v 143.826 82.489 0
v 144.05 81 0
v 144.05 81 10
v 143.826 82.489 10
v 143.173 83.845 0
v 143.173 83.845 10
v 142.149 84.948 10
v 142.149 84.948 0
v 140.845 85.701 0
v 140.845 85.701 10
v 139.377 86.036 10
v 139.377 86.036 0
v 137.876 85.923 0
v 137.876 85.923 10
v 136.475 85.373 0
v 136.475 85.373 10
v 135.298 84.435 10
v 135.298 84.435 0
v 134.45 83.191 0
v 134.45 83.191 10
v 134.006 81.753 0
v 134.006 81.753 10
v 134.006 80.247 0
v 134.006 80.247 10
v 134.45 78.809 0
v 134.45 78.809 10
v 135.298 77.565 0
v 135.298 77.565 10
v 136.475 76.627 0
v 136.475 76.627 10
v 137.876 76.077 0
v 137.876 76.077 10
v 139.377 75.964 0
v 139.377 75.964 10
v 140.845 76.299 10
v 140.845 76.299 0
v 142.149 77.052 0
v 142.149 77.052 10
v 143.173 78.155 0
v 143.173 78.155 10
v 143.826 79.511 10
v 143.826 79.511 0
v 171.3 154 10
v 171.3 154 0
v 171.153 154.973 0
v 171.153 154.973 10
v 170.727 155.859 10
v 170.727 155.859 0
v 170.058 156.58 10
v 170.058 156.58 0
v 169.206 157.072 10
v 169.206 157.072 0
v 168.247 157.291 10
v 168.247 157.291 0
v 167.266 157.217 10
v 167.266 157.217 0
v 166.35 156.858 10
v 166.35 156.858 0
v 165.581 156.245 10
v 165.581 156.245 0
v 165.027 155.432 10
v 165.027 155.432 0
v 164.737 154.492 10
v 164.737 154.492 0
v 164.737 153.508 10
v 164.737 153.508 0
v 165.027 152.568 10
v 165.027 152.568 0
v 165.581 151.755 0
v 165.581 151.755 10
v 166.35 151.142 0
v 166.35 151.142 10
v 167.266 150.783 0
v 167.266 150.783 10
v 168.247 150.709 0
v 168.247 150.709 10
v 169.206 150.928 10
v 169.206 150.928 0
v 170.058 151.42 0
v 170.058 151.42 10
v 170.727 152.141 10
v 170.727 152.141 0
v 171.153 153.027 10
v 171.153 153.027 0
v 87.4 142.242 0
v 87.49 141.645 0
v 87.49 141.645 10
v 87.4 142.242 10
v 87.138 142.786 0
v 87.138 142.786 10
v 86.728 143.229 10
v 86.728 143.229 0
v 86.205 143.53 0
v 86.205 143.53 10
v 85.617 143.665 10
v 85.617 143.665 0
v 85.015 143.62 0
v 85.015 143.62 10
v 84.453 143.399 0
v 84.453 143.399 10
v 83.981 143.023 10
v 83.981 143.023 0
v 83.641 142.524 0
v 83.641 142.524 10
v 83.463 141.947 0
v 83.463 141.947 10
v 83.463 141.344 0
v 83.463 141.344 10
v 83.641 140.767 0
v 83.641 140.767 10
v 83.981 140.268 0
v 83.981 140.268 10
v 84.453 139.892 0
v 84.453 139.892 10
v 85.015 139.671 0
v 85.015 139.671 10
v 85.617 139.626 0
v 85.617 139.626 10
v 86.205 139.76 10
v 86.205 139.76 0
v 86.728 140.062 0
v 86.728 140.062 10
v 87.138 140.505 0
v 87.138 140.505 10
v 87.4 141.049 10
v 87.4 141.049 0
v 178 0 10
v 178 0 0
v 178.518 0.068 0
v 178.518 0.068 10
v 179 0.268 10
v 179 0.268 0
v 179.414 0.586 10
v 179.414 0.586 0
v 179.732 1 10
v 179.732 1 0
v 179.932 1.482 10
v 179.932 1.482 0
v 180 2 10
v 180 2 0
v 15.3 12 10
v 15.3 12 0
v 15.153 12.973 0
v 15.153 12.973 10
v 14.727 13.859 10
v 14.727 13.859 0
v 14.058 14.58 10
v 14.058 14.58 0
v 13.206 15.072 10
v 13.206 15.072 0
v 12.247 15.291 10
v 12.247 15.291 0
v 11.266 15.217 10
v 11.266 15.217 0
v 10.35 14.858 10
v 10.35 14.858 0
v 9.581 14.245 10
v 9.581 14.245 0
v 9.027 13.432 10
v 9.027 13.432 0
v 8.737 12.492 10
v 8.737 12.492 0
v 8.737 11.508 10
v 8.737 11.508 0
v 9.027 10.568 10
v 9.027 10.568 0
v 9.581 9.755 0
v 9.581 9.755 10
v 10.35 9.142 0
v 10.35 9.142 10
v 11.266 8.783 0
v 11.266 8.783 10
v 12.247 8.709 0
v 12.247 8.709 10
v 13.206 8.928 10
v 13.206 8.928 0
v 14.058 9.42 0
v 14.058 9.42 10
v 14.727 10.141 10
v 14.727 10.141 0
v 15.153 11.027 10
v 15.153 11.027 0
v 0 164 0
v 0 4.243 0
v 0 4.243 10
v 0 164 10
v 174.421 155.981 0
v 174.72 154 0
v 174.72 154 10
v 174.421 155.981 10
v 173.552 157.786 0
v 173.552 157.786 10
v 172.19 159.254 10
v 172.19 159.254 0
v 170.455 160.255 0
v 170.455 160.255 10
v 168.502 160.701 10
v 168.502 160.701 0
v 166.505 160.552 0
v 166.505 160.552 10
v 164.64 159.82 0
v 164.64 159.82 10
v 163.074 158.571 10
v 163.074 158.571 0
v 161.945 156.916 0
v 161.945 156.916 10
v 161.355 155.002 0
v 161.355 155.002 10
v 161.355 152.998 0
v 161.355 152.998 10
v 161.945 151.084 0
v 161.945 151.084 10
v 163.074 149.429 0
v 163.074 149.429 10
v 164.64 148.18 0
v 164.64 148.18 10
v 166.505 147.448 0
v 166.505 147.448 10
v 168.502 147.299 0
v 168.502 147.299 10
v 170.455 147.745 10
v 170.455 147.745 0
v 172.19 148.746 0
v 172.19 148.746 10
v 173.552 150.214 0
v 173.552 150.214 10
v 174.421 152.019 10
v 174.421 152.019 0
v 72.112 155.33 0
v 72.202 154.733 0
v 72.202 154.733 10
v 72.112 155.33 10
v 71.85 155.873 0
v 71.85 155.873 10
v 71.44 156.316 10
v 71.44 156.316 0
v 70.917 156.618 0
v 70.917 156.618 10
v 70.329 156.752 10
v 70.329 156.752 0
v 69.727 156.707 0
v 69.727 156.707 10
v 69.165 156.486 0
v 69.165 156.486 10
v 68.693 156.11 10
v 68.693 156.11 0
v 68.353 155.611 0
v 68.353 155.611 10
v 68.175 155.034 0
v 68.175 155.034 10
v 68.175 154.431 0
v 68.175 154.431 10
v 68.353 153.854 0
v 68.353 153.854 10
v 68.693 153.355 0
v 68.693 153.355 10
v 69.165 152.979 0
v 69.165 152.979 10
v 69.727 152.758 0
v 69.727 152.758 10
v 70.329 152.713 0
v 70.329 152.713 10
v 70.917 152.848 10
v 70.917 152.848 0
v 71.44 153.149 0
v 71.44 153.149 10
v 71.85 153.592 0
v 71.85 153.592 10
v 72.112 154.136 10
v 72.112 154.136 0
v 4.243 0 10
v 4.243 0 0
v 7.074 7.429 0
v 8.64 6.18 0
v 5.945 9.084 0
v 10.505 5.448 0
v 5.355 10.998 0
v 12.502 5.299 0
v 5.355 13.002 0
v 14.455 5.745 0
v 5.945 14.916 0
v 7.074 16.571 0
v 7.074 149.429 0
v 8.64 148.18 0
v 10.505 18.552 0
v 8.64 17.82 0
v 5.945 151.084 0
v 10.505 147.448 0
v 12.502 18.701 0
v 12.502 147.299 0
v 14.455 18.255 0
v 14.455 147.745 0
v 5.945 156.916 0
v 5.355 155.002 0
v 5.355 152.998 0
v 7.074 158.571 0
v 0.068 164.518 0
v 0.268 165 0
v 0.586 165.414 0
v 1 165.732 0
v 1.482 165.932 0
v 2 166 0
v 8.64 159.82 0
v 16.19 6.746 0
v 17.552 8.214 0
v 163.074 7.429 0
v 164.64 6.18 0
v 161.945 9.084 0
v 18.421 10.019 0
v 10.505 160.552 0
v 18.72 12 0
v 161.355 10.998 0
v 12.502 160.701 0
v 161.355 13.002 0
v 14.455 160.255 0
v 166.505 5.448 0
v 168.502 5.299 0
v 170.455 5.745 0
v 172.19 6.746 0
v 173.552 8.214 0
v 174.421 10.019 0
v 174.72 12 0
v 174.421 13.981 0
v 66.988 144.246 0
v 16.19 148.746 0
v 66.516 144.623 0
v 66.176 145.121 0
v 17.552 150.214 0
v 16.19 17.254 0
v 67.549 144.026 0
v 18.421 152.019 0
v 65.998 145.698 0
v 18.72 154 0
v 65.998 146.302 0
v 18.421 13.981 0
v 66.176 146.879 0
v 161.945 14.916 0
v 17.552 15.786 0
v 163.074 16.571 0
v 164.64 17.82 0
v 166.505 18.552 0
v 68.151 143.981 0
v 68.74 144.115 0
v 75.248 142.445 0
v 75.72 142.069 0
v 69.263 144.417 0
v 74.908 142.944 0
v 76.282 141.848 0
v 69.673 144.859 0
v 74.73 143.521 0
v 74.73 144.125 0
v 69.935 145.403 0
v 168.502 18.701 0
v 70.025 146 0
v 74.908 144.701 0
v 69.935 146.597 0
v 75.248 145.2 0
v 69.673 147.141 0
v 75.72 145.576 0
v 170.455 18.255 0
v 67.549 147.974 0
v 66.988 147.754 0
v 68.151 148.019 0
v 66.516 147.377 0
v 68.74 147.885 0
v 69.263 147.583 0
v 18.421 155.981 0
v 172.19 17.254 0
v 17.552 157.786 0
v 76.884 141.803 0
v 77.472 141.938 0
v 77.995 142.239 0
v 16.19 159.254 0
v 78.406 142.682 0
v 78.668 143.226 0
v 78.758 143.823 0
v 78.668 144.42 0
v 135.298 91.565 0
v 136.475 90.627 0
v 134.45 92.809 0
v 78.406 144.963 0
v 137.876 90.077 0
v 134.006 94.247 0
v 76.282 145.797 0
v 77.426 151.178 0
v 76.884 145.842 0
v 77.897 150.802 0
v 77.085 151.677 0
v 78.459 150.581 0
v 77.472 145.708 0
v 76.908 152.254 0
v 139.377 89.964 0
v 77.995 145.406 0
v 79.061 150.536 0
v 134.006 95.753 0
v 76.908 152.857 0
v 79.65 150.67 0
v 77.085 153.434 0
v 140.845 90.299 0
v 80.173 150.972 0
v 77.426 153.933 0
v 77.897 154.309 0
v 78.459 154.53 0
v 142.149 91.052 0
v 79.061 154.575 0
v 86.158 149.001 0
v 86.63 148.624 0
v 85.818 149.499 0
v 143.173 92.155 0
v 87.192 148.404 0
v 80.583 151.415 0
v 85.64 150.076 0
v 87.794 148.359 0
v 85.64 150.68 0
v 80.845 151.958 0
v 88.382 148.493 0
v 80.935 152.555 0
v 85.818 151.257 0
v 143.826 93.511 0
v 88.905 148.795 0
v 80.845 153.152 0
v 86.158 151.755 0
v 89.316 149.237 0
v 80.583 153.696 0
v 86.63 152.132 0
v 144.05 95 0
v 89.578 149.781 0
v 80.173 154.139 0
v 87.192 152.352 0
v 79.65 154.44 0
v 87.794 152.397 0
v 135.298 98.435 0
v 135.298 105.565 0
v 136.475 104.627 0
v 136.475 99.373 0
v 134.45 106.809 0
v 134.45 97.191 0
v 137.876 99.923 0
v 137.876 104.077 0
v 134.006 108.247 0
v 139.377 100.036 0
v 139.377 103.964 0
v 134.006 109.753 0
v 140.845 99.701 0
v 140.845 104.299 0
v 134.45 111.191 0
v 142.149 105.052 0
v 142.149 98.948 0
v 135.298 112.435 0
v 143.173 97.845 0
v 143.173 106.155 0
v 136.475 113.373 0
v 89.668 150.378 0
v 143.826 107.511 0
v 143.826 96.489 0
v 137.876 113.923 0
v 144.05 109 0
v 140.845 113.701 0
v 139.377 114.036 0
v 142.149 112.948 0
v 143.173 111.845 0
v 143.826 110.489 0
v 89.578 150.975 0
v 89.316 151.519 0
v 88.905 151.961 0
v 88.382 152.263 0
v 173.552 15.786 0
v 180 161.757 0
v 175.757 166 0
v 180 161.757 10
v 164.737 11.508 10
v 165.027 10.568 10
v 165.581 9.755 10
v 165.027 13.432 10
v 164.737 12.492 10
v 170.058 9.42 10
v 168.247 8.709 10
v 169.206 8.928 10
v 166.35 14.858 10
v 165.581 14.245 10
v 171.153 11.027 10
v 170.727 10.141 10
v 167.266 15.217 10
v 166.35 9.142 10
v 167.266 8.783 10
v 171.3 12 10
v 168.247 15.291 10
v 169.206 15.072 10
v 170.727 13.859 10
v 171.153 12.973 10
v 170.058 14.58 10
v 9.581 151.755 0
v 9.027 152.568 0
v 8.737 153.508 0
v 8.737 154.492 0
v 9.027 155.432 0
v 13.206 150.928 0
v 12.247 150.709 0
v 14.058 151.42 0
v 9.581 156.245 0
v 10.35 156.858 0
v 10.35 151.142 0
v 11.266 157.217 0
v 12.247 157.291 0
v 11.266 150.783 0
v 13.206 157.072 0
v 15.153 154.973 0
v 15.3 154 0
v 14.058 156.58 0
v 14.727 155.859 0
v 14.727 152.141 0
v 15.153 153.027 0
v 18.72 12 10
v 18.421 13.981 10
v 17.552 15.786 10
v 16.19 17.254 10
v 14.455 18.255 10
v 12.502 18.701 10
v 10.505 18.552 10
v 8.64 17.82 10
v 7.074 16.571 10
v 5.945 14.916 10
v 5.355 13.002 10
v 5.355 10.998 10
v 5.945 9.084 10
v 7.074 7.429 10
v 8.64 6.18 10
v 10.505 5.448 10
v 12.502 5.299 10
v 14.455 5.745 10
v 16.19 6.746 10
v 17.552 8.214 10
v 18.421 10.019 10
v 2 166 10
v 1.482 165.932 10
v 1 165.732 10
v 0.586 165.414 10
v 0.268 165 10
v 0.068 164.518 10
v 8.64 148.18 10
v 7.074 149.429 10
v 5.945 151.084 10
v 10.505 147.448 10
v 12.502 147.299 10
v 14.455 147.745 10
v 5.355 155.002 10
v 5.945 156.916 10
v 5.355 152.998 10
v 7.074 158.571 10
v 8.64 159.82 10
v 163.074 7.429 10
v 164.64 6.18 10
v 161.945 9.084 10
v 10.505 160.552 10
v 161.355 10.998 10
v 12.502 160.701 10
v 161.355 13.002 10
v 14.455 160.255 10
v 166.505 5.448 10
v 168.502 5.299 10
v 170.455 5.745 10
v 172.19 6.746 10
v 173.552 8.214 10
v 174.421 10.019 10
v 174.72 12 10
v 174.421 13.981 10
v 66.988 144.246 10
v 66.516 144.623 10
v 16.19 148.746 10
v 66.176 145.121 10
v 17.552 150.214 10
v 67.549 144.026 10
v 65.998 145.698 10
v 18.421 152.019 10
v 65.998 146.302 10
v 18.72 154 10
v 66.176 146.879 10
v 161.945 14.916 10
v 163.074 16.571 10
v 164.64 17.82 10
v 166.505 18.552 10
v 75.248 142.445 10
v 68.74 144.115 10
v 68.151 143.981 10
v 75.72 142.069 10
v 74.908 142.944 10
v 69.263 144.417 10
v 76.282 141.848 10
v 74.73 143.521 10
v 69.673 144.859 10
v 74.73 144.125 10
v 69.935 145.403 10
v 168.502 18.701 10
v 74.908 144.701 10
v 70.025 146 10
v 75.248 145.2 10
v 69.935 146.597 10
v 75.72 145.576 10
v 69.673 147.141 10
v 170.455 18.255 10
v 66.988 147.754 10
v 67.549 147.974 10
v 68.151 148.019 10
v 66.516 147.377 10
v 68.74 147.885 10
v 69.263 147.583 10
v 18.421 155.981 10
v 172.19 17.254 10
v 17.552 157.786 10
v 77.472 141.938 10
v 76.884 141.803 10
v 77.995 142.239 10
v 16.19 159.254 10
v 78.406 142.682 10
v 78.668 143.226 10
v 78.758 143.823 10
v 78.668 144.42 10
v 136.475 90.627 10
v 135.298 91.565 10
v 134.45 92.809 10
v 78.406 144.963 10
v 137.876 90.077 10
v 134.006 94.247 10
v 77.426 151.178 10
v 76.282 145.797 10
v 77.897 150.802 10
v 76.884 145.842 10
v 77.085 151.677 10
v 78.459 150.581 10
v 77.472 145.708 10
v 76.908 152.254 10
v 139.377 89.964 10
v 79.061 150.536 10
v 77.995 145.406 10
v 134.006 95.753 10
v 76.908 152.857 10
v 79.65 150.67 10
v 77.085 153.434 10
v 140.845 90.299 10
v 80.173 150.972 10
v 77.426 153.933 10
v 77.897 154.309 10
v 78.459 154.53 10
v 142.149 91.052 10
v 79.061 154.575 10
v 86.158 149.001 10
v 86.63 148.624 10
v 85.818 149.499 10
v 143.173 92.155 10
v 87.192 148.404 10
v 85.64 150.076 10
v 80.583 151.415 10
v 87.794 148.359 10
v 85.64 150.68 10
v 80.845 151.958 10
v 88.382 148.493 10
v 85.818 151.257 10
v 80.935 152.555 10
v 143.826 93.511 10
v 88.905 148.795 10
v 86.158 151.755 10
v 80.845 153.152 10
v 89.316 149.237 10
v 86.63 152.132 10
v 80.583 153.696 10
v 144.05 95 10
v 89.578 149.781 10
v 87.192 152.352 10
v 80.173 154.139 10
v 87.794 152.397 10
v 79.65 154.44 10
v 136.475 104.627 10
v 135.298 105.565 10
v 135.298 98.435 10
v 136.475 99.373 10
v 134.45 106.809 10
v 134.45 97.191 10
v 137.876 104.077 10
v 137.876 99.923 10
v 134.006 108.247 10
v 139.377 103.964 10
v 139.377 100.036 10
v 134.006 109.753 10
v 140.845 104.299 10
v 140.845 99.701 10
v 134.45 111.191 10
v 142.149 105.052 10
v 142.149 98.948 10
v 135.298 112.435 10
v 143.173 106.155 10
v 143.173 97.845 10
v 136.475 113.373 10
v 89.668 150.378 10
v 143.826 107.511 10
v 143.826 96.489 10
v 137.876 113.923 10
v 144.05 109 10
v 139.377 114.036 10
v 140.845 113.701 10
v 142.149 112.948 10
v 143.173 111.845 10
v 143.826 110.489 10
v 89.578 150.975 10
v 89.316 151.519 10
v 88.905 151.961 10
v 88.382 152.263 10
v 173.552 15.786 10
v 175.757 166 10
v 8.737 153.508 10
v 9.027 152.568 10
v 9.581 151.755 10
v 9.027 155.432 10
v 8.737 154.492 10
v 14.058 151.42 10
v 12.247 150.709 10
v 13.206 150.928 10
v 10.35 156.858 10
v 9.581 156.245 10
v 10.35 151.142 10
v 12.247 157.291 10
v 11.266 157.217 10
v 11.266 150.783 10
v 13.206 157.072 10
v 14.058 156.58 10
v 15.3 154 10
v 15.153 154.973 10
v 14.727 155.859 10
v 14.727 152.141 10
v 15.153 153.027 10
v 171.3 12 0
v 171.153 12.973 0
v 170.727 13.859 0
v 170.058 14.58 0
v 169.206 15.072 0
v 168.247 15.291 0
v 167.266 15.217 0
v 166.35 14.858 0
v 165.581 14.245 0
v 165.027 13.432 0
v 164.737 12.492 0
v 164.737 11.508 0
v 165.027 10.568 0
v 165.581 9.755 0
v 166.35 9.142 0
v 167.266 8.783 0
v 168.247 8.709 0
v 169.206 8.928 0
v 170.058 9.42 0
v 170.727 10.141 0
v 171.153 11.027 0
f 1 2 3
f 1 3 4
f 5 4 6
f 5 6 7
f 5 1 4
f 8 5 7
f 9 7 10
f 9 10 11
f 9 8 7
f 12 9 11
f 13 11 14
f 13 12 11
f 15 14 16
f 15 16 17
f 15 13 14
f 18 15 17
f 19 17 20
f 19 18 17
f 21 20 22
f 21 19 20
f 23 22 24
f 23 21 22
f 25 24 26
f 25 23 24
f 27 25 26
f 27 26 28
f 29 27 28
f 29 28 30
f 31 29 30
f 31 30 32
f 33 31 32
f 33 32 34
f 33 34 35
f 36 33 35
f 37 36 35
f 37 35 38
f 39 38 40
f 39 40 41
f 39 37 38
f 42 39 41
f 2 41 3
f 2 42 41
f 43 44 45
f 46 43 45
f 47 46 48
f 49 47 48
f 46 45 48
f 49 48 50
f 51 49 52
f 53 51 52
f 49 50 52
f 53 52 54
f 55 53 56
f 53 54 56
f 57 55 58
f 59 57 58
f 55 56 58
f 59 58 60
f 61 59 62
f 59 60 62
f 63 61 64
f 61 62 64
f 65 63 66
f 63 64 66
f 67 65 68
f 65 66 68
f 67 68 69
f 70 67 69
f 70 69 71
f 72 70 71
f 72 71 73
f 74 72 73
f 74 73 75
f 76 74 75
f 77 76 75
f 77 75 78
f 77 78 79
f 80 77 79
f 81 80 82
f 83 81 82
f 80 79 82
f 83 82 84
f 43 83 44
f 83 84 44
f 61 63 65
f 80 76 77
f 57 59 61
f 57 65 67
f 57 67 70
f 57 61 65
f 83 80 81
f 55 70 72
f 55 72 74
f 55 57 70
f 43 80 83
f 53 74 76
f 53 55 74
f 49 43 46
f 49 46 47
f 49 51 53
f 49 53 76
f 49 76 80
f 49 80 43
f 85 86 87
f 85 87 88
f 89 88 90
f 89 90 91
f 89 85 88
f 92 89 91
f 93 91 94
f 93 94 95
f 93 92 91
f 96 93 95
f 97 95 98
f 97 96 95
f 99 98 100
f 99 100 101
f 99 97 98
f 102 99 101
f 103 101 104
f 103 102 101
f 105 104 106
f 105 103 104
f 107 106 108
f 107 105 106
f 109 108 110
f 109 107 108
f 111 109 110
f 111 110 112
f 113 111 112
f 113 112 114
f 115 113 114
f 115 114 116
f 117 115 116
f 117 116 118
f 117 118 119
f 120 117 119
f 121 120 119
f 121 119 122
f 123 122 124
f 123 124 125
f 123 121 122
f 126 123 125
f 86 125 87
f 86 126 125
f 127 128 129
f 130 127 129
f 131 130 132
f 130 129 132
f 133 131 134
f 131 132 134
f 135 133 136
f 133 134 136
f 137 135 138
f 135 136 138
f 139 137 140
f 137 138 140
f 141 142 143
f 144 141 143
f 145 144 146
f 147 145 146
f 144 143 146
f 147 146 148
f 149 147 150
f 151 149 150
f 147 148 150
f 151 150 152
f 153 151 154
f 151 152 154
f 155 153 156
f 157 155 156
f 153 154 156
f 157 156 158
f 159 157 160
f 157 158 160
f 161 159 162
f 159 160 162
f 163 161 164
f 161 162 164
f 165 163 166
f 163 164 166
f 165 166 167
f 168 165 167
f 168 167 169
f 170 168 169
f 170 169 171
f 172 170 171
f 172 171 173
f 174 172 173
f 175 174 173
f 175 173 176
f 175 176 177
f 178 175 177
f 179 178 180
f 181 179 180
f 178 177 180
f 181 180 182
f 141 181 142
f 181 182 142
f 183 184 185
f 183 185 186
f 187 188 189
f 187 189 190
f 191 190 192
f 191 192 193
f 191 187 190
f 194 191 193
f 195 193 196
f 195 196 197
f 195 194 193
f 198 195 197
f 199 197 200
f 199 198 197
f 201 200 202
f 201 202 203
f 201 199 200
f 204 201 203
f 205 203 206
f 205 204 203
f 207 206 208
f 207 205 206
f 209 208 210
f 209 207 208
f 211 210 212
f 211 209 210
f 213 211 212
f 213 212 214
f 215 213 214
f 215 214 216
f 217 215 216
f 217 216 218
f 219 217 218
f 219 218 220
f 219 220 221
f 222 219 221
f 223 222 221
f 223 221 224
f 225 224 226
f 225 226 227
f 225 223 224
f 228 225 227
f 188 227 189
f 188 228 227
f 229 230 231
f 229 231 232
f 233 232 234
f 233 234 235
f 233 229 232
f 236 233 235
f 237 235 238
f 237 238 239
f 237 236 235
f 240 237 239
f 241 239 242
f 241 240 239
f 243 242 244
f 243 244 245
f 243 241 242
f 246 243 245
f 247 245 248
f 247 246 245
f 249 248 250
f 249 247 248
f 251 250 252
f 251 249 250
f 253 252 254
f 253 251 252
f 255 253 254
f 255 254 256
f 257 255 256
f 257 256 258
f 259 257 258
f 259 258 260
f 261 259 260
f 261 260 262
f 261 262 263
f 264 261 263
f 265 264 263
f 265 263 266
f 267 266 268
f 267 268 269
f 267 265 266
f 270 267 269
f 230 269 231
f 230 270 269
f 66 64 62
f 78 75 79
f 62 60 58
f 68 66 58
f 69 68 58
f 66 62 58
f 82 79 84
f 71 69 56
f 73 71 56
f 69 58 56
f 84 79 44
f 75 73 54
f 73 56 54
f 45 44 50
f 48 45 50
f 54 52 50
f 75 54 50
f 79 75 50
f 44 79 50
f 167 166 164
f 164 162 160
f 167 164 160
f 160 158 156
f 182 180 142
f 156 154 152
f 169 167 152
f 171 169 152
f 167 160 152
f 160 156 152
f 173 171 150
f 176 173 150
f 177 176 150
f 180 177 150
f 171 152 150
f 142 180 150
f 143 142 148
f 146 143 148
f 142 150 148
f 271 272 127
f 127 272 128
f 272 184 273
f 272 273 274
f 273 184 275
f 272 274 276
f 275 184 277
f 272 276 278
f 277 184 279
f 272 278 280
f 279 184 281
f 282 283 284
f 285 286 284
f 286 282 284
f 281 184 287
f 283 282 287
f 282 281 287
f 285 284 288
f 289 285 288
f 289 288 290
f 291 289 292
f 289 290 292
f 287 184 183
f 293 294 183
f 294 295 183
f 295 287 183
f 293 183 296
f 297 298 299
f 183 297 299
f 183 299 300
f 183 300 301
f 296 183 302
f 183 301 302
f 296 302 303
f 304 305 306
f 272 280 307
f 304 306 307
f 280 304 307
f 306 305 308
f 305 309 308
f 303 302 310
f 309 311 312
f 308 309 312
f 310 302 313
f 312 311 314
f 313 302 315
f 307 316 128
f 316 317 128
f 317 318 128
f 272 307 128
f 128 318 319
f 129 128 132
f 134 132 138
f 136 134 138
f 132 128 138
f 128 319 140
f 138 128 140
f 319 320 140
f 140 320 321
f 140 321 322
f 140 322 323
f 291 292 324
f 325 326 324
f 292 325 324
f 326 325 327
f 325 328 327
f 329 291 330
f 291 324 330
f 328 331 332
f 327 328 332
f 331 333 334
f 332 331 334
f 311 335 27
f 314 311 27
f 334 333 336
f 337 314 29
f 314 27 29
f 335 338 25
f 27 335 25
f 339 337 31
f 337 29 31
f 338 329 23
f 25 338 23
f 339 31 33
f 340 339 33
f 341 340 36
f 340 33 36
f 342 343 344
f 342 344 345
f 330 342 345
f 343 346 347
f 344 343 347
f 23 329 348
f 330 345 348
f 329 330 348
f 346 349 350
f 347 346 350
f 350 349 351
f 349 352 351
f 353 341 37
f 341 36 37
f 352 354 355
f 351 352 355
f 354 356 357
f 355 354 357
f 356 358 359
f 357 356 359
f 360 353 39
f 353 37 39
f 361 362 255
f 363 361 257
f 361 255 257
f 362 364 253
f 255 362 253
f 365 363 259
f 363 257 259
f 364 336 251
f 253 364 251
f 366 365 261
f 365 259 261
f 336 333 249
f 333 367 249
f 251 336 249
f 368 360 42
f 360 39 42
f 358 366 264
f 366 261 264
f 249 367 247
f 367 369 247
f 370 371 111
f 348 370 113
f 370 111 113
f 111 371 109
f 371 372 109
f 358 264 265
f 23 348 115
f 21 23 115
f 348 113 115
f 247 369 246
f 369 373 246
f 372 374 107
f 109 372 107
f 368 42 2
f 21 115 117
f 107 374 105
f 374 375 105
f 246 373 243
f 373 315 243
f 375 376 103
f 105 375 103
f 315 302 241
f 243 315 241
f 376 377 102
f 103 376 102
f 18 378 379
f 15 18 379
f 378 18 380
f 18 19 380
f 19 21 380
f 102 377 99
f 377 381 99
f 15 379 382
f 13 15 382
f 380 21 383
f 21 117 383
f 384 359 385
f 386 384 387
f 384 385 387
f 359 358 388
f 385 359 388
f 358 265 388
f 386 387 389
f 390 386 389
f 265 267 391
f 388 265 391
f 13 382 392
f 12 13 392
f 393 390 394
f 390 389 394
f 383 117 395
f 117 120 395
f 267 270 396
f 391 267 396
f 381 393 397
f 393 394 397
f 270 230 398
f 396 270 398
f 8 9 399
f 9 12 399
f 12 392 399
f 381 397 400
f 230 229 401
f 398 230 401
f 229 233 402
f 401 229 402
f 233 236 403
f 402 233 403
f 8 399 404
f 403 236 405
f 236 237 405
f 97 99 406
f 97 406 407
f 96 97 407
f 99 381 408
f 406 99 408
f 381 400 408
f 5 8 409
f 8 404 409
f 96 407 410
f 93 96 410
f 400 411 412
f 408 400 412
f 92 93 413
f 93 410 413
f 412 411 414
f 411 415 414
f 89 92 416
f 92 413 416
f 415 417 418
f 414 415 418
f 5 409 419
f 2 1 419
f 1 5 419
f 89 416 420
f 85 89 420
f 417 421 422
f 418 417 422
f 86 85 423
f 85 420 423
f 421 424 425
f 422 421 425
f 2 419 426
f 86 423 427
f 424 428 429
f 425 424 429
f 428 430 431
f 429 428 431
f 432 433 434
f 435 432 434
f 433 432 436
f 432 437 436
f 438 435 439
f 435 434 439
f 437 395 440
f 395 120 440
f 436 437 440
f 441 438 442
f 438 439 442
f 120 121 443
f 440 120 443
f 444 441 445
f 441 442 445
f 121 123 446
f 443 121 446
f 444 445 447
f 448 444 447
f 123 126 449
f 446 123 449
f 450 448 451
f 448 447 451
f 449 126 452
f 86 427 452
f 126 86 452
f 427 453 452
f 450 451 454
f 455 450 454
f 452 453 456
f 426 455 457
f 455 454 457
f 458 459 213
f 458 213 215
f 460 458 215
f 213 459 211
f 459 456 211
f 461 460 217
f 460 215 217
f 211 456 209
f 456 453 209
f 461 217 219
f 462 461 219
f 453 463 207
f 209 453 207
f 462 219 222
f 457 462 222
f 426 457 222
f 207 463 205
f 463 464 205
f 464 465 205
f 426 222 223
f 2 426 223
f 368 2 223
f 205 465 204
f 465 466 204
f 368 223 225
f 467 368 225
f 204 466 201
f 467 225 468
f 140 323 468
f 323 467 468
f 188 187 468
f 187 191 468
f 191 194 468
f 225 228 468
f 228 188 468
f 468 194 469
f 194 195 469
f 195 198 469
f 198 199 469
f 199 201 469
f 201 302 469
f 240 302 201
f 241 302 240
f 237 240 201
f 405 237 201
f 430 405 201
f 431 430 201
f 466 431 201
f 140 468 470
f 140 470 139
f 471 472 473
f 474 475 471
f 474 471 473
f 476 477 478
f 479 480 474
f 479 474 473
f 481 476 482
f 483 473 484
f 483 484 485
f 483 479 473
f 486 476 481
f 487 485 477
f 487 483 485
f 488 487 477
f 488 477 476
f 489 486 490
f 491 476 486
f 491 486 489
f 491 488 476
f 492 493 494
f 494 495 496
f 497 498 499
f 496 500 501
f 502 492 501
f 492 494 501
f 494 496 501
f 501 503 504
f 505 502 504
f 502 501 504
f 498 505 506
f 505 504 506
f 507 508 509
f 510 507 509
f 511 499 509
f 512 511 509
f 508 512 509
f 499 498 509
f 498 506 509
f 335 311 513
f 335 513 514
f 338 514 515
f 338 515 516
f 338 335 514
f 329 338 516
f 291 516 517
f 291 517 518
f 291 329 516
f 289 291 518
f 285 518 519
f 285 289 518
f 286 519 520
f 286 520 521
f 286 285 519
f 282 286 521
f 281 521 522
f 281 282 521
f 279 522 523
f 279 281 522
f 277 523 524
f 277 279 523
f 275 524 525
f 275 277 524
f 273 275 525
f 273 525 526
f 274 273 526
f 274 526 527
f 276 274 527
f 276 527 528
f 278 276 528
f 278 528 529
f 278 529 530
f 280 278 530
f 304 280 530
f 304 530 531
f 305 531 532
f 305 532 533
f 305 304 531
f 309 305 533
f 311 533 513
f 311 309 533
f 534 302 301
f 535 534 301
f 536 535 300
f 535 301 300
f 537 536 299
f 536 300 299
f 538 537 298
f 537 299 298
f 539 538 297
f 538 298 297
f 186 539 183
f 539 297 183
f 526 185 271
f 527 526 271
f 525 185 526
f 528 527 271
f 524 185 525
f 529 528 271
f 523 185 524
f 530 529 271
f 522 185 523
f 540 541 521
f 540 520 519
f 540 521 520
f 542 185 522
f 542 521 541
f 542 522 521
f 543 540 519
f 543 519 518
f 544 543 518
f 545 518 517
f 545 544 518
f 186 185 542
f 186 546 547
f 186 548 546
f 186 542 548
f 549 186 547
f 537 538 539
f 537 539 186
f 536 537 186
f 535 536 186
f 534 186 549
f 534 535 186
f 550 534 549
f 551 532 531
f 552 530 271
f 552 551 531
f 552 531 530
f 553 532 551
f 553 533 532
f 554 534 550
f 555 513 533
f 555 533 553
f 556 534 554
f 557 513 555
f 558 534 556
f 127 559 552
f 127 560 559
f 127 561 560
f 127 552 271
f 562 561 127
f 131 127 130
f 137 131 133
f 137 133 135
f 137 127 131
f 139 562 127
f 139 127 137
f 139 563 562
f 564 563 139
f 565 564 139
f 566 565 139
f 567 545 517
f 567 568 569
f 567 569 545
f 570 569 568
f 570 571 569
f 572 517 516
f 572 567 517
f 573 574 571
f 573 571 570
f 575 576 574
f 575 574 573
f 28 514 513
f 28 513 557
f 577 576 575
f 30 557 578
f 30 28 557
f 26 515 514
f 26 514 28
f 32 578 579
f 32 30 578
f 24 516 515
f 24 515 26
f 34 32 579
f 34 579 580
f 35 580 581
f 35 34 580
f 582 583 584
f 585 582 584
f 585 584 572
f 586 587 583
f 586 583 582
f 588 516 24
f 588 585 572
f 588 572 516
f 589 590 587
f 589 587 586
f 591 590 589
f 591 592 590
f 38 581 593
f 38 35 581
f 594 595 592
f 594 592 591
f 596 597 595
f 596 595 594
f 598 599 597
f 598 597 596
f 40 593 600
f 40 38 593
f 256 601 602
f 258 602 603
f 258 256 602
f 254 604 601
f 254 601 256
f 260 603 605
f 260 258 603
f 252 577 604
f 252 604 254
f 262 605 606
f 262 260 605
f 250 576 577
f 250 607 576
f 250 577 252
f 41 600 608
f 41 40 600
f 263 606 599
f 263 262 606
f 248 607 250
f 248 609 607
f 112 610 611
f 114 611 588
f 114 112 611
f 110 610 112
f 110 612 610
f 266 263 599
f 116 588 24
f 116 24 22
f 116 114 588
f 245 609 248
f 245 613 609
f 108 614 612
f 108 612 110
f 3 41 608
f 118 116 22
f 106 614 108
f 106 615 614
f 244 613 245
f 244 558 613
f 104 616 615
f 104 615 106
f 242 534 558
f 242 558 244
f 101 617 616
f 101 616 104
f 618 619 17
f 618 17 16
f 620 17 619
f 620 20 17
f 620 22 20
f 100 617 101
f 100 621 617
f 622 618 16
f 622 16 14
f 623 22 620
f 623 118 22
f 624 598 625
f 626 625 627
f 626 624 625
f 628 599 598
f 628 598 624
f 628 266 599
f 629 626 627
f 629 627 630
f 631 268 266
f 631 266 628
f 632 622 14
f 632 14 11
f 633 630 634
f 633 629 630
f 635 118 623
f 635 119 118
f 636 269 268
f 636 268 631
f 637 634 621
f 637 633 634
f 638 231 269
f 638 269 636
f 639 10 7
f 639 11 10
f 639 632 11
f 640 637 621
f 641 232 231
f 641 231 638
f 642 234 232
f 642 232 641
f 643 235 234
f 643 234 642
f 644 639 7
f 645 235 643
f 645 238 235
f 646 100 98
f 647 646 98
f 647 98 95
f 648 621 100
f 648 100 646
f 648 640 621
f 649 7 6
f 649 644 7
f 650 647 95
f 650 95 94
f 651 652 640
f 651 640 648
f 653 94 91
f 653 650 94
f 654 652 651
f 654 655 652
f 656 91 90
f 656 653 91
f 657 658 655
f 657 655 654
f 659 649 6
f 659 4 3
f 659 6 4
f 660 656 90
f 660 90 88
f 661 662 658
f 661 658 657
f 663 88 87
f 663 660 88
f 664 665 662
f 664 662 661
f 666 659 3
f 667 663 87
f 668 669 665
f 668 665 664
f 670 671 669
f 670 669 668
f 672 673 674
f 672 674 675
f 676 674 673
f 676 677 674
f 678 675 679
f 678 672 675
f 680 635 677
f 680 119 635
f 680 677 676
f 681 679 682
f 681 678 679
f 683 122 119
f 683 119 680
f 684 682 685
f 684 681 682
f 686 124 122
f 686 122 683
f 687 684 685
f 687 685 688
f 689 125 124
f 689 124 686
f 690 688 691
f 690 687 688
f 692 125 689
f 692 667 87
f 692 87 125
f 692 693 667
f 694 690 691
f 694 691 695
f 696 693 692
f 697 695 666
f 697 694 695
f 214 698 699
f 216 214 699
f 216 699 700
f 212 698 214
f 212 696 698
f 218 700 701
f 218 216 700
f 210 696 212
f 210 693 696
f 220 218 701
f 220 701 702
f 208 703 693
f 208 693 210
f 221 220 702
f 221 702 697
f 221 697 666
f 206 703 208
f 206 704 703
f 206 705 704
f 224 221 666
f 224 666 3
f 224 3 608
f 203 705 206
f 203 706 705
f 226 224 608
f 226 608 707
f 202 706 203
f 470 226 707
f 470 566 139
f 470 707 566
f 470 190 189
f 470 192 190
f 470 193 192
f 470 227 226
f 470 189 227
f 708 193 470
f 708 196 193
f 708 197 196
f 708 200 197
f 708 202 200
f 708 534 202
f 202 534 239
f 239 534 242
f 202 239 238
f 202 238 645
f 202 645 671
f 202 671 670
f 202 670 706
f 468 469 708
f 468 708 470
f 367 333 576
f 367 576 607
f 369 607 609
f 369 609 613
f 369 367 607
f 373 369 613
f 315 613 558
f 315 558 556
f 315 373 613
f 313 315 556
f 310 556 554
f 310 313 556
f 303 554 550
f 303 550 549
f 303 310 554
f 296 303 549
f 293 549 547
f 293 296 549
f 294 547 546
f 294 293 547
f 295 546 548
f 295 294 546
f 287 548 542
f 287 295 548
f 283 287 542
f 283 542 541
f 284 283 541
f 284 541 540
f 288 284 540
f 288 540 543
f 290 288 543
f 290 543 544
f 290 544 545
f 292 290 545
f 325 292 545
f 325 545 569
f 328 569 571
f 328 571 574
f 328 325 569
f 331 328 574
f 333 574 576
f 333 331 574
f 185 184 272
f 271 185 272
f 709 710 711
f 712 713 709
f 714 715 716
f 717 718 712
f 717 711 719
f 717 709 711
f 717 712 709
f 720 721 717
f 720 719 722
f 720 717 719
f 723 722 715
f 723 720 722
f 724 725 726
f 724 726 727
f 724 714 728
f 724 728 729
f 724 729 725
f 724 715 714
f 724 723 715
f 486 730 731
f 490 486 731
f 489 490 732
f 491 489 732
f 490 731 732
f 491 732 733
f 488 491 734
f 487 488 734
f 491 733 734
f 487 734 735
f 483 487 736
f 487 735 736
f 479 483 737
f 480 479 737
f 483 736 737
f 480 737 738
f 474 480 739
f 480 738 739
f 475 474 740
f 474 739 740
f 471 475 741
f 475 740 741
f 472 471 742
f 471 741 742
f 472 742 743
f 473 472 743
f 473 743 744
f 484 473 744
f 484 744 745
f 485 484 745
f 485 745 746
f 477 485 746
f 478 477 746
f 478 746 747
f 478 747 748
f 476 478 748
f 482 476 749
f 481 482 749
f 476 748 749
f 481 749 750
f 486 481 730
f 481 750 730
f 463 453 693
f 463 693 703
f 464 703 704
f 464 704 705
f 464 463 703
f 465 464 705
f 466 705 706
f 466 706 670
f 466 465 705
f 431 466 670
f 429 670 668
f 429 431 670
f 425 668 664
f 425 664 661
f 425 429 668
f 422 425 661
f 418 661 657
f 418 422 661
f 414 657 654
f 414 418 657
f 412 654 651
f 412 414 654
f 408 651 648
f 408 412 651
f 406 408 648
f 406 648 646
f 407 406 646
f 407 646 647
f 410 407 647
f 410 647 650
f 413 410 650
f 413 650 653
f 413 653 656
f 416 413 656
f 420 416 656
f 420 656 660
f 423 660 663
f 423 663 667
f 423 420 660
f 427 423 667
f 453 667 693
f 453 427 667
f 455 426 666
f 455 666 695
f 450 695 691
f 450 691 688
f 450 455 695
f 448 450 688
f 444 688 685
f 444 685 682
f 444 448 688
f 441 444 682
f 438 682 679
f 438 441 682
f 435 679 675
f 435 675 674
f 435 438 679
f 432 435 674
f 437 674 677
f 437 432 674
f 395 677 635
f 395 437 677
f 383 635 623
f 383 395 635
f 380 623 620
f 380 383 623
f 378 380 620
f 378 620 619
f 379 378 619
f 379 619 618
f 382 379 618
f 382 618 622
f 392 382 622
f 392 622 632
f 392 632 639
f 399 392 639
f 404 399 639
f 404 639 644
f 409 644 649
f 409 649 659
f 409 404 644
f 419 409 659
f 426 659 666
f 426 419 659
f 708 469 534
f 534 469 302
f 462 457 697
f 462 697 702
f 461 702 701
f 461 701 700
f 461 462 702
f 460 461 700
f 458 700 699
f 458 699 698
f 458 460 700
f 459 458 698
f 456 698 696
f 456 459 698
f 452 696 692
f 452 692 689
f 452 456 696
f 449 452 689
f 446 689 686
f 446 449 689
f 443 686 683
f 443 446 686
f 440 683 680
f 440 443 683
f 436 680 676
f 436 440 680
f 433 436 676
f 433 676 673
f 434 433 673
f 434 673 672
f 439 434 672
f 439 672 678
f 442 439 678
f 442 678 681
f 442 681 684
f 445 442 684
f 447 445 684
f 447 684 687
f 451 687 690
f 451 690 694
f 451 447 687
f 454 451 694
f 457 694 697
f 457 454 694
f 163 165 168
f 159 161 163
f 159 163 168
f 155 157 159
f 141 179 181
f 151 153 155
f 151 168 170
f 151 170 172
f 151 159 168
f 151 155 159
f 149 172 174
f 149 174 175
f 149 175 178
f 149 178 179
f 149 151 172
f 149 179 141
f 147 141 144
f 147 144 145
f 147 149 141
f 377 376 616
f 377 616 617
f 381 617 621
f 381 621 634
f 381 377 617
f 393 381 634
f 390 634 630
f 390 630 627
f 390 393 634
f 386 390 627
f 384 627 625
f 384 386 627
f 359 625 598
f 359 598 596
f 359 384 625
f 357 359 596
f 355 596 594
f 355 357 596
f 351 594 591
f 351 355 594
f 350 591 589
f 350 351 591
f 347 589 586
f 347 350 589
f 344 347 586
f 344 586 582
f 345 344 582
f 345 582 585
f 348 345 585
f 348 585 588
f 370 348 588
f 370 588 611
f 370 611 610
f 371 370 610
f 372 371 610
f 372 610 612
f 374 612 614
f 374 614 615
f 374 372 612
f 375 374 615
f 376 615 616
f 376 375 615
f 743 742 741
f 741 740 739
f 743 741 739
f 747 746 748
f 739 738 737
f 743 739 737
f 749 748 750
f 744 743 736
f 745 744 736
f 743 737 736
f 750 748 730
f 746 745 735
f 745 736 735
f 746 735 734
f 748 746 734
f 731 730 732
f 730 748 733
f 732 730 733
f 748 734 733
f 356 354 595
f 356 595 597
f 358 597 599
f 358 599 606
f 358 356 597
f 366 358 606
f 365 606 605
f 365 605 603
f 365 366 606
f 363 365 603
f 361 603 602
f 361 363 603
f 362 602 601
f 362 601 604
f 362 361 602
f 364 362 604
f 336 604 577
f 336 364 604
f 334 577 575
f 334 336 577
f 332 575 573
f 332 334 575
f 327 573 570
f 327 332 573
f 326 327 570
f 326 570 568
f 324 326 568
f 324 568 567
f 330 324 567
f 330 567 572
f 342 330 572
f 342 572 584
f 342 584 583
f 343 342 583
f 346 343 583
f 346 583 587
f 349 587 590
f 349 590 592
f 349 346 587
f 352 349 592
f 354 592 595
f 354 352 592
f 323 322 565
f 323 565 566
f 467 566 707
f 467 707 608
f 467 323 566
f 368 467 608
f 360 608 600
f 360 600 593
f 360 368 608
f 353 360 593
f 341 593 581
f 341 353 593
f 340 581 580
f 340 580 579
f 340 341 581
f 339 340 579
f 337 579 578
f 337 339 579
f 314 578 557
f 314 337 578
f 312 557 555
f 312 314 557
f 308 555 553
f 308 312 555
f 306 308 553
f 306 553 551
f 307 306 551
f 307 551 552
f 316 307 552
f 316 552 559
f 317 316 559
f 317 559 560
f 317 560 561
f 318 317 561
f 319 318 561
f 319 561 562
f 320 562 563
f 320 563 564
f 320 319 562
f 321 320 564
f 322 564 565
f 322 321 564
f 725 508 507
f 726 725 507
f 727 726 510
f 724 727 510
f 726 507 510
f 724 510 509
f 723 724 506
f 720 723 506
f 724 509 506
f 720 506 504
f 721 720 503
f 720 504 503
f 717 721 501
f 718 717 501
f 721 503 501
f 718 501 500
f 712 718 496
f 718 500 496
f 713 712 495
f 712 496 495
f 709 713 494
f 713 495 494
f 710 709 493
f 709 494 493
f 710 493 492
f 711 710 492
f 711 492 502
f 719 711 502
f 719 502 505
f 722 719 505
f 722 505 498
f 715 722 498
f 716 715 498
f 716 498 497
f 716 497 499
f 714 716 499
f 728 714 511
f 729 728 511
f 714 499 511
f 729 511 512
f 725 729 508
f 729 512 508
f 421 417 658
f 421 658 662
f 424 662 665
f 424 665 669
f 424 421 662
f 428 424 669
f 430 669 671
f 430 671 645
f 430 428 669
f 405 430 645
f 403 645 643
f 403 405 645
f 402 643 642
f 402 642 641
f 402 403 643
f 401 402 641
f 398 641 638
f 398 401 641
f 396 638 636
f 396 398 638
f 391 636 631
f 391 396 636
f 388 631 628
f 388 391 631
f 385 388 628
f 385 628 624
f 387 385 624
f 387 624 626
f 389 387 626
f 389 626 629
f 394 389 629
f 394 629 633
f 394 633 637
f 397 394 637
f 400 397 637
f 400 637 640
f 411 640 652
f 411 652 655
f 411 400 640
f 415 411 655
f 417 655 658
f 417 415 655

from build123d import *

# Parameters (mm, degrees)
SKETCH_R      = 6.72
SKETCH_R_2    = 5.05
SKETCH_R_3    = 2.025
SKETCH_R_4    = 3.3
EXTRUDE_DEPTH = 10


with BuildPart() as part:
    # Sketch → Extrude (new body)
    with BuildSketch(Plane.XY):
        with BuildLine():
            ThreePointArc((2, 166), (0.585786, 165.414214), (0, 164))
            Line((0, 4.242641), (0, 164))
            Line((0, 4.242641), (4.242641, 0))
            Line((4.242641, 0), (178, 0))
            ThreePointArc((178, 0), (179.414214, 0.585786), (180, 2))
            Line((180, 161.757359), (180, 2))
            Line((175.757359, 166), (180, 161.757359))
            Line((175.757359, 166), (2, 166))
        make_face()
        with Locations((12, 154)):
            Circle(SKETCH_R, mode=Mode.SUBTRACT)
        with Locations((168, 154)):
            Circle(SKETCH_R, mode=Mode.SUBTRACT)
        with Locations((168, 12)):
            Circle(SKETCH_R, mode=Mode.SUBTRACT)
        with Locations((12, 12)):
            Circle(SKETCH_R, mode=Mode.SUBTRACT)
        with Locations((139, 109)):
            Circle(SKETCH_R_2, mode=Mode.SUBTRACT)
        with Locations((139, 95)):
            Circle(SKETCH_R_2, mode=Mode.SUBTRACT)
        with Locations((139, 81)):
            Circle(SKETCH_R_2, mode=Mode.SUBTRACT)
        with Locations((70.177297, 154.732662)):
            Circle(SKETCH_R_3, mode=Mode.SUBTRACT)
        with Locations((78.909959, 152.555364)):
            Circle(SKETCH_R_3, mode=Mode.SUBTRACT)
        with Locations((87.64262, 150.378067)):
            Circle(SKETCH_R_3, mode=Mode.SUBTRACT)
        with Locations((68, 146)):
            Circle(SKETCH_R_3, mode=Mode.SUBTRACT)
        with Locations((76.732662, 143.822703)):
            Circle(SKETCH_R_3, mode=Mode.SUBTRACT)
        with Locations((85.465323, 141.645406)):
            Circle(SKETCH_R_3, mode=Mode.SUBTRACT)
        with Locations((12, 154)):
            Circle(SKETCH_R_4)
        with Locations((168, 154)):
            Circle(SKETCH_R_4)
        with Locations((168, 12)):
            Circle(SKETCH_R_4)
        with Locations((12, 12)):
            Circle(SKETCH_R_4)
    extrude(amount=EXTRUDE_DEPTH)


solid = part.part
